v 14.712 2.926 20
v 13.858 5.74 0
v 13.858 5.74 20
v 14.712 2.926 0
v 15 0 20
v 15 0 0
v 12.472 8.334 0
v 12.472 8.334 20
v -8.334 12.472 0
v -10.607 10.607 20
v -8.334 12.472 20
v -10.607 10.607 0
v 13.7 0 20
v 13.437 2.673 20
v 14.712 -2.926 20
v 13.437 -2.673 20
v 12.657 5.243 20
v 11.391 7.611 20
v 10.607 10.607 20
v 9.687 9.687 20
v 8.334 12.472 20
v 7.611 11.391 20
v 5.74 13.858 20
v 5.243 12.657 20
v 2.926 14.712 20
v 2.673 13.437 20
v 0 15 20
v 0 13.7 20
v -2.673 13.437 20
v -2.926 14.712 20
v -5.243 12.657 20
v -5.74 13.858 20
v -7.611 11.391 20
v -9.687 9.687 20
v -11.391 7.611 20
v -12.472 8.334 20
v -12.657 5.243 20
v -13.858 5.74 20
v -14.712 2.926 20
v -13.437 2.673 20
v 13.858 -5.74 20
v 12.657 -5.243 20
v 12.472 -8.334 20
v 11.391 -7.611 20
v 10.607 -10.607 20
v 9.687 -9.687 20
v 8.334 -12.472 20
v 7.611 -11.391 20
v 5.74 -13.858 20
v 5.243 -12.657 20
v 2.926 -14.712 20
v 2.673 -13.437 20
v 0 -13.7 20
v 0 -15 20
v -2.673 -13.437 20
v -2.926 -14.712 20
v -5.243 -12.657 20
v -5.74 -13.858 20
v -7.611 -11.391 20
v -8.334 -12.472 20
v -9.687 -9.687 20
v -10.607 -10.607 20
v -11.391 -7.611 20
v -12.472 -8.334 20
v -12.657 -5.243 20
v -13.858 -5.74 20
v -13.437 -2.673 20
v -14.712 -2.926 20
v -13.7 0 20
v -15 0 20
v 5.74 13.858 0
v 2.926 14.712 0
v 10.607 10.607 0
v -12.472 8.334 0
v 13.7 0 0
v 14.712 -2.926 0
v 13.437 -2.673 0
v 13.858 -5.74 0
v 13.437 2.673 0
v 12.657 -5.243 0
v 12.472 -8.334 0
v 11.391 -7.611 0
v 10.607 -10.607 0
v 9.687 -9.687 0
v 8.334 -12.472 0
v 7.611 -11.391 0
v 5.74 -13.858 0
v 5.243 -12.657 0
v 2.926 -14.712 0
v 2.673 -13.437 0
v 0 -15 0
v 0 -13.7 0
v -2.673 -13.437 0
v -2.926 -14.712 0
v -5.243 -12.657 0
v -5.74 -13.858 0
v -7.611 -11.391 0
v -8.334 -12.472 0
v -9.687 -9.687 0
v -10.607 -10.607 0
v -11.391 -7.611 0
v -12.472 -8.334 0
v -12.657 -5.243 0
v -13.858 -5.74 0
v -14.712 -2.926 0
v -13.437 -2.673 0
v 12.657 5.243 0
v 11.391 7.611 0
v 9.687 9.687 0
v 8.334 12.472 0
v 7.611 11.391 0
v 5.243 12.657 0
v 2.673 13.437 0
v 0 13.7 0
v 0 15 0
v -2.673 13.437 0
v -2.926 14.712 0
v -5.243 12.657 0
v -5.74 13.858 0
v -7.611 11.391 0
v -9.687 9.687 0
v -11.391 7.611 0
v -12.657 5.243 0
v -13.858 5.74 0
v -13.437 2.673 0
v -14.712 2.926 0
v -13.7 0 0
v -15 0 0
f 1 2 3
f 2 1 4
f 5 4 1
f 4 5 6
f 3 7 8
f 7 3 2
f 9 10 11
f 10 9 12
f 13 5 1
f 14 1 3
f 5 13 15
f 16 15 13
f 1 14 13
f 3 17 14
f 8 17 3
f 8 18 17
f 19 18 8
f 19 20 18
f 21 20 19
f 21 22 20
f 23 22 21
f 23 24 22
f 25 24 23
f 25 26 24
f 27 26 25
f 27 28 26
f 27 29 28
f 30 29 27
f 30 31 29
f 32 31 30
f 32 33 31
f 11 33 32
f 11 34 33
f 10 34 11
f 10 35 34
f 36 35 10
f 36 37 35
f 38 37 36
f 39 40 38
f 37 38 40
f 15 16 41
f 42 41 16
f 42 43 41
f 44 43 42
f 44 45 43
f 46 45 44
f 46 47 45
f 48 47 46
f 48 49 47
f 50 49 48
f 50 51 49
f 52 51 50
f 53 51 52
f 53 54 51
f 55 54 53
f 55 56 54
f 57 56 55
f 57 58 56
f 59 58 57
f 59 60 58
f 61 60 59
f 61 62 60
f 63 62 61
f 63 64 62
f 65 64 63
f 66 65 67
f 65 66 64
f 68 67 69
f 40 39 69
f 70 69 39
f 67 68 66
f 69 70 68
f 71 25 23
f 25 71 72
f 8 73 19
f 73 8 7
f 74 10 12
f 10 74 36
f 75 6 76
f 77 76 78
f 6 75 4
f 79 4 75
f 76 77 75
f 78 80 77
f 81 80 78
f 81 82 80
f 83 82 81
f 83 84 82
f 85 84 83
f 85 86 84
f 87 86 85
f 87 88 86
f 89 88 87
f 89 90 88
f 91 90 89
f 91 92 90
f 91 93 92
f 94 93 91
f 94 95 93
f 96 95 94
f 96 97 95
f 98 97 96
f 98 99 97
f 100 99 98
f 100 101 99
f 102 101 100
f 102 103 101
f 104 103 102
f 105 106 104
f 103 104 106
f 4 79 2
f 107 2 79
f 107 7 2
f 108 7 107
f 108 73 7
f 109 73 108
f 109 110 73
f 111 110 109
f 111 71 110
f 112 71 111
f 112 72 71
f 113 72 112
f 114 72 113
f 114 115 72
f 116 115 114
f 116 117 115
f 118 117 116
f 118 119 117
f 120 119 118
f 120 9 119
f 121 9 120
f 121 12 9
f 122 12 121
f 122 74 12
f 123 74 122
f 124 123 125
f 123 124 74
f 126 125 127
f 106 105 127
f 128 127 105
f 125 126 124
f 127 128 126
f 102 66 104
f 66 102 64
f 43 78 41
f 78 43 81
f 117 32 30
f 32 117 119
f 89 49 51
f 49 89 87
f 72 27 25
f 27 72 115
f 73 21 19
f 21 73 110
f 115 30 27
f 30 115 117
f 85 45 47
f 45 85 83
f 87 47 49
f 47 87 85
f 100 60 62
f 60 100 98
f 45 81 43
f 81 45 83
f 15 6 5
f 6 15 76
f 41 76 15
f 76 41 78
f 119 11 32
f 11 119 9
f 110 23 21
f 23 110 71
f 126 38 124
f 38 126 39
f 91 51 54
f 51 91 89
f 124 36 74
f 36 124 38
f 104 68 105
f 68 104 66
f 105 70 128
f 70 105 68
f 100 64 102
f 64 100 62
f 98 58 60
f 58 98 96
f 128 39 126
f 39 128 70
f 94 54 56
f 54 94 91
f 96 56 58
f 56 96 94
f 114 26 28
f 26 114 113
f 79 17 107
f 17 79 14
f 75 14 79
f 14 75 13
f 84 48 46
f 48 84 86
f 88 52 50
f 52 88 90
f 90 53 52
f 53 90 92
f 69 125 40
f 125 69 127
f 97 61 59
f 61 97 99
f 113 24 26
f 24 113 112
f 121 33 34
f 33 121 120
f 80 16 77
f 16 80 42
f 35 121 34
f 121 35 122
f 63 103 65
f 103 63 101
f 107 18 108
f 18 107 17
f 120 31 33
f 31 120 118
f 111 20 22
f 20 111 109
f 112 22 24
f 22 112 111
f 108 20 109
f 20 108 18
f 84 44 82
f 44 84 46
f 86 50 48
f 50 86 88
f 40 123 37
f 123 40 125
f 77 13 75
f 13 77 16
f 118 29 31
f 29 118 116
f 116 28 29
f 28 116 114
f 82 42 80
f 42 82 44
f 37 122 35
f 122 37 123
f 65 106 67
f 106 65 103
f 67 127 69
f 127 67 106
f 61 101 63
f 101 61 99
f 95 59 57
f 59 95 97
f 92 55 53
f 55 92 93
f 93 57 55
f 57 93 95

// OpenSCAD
$fn = 32;

// ----------------------------------------------------------------------
// Thin tube: 1.3 mm wall
// ----------------------------------------------------------------------

// --- parameters (mm) ---
tube_od = 30;             // outer diameter
tube_h = 20;              // height, Z
wall = 1.3;               // wall thickness

difference() {
  cylinder(h = tube_h, d = tube_od);
  translate([0, 0, -1]) cylinder(h = tube_h + 2, d = tube_od - 2 * wall);
}
